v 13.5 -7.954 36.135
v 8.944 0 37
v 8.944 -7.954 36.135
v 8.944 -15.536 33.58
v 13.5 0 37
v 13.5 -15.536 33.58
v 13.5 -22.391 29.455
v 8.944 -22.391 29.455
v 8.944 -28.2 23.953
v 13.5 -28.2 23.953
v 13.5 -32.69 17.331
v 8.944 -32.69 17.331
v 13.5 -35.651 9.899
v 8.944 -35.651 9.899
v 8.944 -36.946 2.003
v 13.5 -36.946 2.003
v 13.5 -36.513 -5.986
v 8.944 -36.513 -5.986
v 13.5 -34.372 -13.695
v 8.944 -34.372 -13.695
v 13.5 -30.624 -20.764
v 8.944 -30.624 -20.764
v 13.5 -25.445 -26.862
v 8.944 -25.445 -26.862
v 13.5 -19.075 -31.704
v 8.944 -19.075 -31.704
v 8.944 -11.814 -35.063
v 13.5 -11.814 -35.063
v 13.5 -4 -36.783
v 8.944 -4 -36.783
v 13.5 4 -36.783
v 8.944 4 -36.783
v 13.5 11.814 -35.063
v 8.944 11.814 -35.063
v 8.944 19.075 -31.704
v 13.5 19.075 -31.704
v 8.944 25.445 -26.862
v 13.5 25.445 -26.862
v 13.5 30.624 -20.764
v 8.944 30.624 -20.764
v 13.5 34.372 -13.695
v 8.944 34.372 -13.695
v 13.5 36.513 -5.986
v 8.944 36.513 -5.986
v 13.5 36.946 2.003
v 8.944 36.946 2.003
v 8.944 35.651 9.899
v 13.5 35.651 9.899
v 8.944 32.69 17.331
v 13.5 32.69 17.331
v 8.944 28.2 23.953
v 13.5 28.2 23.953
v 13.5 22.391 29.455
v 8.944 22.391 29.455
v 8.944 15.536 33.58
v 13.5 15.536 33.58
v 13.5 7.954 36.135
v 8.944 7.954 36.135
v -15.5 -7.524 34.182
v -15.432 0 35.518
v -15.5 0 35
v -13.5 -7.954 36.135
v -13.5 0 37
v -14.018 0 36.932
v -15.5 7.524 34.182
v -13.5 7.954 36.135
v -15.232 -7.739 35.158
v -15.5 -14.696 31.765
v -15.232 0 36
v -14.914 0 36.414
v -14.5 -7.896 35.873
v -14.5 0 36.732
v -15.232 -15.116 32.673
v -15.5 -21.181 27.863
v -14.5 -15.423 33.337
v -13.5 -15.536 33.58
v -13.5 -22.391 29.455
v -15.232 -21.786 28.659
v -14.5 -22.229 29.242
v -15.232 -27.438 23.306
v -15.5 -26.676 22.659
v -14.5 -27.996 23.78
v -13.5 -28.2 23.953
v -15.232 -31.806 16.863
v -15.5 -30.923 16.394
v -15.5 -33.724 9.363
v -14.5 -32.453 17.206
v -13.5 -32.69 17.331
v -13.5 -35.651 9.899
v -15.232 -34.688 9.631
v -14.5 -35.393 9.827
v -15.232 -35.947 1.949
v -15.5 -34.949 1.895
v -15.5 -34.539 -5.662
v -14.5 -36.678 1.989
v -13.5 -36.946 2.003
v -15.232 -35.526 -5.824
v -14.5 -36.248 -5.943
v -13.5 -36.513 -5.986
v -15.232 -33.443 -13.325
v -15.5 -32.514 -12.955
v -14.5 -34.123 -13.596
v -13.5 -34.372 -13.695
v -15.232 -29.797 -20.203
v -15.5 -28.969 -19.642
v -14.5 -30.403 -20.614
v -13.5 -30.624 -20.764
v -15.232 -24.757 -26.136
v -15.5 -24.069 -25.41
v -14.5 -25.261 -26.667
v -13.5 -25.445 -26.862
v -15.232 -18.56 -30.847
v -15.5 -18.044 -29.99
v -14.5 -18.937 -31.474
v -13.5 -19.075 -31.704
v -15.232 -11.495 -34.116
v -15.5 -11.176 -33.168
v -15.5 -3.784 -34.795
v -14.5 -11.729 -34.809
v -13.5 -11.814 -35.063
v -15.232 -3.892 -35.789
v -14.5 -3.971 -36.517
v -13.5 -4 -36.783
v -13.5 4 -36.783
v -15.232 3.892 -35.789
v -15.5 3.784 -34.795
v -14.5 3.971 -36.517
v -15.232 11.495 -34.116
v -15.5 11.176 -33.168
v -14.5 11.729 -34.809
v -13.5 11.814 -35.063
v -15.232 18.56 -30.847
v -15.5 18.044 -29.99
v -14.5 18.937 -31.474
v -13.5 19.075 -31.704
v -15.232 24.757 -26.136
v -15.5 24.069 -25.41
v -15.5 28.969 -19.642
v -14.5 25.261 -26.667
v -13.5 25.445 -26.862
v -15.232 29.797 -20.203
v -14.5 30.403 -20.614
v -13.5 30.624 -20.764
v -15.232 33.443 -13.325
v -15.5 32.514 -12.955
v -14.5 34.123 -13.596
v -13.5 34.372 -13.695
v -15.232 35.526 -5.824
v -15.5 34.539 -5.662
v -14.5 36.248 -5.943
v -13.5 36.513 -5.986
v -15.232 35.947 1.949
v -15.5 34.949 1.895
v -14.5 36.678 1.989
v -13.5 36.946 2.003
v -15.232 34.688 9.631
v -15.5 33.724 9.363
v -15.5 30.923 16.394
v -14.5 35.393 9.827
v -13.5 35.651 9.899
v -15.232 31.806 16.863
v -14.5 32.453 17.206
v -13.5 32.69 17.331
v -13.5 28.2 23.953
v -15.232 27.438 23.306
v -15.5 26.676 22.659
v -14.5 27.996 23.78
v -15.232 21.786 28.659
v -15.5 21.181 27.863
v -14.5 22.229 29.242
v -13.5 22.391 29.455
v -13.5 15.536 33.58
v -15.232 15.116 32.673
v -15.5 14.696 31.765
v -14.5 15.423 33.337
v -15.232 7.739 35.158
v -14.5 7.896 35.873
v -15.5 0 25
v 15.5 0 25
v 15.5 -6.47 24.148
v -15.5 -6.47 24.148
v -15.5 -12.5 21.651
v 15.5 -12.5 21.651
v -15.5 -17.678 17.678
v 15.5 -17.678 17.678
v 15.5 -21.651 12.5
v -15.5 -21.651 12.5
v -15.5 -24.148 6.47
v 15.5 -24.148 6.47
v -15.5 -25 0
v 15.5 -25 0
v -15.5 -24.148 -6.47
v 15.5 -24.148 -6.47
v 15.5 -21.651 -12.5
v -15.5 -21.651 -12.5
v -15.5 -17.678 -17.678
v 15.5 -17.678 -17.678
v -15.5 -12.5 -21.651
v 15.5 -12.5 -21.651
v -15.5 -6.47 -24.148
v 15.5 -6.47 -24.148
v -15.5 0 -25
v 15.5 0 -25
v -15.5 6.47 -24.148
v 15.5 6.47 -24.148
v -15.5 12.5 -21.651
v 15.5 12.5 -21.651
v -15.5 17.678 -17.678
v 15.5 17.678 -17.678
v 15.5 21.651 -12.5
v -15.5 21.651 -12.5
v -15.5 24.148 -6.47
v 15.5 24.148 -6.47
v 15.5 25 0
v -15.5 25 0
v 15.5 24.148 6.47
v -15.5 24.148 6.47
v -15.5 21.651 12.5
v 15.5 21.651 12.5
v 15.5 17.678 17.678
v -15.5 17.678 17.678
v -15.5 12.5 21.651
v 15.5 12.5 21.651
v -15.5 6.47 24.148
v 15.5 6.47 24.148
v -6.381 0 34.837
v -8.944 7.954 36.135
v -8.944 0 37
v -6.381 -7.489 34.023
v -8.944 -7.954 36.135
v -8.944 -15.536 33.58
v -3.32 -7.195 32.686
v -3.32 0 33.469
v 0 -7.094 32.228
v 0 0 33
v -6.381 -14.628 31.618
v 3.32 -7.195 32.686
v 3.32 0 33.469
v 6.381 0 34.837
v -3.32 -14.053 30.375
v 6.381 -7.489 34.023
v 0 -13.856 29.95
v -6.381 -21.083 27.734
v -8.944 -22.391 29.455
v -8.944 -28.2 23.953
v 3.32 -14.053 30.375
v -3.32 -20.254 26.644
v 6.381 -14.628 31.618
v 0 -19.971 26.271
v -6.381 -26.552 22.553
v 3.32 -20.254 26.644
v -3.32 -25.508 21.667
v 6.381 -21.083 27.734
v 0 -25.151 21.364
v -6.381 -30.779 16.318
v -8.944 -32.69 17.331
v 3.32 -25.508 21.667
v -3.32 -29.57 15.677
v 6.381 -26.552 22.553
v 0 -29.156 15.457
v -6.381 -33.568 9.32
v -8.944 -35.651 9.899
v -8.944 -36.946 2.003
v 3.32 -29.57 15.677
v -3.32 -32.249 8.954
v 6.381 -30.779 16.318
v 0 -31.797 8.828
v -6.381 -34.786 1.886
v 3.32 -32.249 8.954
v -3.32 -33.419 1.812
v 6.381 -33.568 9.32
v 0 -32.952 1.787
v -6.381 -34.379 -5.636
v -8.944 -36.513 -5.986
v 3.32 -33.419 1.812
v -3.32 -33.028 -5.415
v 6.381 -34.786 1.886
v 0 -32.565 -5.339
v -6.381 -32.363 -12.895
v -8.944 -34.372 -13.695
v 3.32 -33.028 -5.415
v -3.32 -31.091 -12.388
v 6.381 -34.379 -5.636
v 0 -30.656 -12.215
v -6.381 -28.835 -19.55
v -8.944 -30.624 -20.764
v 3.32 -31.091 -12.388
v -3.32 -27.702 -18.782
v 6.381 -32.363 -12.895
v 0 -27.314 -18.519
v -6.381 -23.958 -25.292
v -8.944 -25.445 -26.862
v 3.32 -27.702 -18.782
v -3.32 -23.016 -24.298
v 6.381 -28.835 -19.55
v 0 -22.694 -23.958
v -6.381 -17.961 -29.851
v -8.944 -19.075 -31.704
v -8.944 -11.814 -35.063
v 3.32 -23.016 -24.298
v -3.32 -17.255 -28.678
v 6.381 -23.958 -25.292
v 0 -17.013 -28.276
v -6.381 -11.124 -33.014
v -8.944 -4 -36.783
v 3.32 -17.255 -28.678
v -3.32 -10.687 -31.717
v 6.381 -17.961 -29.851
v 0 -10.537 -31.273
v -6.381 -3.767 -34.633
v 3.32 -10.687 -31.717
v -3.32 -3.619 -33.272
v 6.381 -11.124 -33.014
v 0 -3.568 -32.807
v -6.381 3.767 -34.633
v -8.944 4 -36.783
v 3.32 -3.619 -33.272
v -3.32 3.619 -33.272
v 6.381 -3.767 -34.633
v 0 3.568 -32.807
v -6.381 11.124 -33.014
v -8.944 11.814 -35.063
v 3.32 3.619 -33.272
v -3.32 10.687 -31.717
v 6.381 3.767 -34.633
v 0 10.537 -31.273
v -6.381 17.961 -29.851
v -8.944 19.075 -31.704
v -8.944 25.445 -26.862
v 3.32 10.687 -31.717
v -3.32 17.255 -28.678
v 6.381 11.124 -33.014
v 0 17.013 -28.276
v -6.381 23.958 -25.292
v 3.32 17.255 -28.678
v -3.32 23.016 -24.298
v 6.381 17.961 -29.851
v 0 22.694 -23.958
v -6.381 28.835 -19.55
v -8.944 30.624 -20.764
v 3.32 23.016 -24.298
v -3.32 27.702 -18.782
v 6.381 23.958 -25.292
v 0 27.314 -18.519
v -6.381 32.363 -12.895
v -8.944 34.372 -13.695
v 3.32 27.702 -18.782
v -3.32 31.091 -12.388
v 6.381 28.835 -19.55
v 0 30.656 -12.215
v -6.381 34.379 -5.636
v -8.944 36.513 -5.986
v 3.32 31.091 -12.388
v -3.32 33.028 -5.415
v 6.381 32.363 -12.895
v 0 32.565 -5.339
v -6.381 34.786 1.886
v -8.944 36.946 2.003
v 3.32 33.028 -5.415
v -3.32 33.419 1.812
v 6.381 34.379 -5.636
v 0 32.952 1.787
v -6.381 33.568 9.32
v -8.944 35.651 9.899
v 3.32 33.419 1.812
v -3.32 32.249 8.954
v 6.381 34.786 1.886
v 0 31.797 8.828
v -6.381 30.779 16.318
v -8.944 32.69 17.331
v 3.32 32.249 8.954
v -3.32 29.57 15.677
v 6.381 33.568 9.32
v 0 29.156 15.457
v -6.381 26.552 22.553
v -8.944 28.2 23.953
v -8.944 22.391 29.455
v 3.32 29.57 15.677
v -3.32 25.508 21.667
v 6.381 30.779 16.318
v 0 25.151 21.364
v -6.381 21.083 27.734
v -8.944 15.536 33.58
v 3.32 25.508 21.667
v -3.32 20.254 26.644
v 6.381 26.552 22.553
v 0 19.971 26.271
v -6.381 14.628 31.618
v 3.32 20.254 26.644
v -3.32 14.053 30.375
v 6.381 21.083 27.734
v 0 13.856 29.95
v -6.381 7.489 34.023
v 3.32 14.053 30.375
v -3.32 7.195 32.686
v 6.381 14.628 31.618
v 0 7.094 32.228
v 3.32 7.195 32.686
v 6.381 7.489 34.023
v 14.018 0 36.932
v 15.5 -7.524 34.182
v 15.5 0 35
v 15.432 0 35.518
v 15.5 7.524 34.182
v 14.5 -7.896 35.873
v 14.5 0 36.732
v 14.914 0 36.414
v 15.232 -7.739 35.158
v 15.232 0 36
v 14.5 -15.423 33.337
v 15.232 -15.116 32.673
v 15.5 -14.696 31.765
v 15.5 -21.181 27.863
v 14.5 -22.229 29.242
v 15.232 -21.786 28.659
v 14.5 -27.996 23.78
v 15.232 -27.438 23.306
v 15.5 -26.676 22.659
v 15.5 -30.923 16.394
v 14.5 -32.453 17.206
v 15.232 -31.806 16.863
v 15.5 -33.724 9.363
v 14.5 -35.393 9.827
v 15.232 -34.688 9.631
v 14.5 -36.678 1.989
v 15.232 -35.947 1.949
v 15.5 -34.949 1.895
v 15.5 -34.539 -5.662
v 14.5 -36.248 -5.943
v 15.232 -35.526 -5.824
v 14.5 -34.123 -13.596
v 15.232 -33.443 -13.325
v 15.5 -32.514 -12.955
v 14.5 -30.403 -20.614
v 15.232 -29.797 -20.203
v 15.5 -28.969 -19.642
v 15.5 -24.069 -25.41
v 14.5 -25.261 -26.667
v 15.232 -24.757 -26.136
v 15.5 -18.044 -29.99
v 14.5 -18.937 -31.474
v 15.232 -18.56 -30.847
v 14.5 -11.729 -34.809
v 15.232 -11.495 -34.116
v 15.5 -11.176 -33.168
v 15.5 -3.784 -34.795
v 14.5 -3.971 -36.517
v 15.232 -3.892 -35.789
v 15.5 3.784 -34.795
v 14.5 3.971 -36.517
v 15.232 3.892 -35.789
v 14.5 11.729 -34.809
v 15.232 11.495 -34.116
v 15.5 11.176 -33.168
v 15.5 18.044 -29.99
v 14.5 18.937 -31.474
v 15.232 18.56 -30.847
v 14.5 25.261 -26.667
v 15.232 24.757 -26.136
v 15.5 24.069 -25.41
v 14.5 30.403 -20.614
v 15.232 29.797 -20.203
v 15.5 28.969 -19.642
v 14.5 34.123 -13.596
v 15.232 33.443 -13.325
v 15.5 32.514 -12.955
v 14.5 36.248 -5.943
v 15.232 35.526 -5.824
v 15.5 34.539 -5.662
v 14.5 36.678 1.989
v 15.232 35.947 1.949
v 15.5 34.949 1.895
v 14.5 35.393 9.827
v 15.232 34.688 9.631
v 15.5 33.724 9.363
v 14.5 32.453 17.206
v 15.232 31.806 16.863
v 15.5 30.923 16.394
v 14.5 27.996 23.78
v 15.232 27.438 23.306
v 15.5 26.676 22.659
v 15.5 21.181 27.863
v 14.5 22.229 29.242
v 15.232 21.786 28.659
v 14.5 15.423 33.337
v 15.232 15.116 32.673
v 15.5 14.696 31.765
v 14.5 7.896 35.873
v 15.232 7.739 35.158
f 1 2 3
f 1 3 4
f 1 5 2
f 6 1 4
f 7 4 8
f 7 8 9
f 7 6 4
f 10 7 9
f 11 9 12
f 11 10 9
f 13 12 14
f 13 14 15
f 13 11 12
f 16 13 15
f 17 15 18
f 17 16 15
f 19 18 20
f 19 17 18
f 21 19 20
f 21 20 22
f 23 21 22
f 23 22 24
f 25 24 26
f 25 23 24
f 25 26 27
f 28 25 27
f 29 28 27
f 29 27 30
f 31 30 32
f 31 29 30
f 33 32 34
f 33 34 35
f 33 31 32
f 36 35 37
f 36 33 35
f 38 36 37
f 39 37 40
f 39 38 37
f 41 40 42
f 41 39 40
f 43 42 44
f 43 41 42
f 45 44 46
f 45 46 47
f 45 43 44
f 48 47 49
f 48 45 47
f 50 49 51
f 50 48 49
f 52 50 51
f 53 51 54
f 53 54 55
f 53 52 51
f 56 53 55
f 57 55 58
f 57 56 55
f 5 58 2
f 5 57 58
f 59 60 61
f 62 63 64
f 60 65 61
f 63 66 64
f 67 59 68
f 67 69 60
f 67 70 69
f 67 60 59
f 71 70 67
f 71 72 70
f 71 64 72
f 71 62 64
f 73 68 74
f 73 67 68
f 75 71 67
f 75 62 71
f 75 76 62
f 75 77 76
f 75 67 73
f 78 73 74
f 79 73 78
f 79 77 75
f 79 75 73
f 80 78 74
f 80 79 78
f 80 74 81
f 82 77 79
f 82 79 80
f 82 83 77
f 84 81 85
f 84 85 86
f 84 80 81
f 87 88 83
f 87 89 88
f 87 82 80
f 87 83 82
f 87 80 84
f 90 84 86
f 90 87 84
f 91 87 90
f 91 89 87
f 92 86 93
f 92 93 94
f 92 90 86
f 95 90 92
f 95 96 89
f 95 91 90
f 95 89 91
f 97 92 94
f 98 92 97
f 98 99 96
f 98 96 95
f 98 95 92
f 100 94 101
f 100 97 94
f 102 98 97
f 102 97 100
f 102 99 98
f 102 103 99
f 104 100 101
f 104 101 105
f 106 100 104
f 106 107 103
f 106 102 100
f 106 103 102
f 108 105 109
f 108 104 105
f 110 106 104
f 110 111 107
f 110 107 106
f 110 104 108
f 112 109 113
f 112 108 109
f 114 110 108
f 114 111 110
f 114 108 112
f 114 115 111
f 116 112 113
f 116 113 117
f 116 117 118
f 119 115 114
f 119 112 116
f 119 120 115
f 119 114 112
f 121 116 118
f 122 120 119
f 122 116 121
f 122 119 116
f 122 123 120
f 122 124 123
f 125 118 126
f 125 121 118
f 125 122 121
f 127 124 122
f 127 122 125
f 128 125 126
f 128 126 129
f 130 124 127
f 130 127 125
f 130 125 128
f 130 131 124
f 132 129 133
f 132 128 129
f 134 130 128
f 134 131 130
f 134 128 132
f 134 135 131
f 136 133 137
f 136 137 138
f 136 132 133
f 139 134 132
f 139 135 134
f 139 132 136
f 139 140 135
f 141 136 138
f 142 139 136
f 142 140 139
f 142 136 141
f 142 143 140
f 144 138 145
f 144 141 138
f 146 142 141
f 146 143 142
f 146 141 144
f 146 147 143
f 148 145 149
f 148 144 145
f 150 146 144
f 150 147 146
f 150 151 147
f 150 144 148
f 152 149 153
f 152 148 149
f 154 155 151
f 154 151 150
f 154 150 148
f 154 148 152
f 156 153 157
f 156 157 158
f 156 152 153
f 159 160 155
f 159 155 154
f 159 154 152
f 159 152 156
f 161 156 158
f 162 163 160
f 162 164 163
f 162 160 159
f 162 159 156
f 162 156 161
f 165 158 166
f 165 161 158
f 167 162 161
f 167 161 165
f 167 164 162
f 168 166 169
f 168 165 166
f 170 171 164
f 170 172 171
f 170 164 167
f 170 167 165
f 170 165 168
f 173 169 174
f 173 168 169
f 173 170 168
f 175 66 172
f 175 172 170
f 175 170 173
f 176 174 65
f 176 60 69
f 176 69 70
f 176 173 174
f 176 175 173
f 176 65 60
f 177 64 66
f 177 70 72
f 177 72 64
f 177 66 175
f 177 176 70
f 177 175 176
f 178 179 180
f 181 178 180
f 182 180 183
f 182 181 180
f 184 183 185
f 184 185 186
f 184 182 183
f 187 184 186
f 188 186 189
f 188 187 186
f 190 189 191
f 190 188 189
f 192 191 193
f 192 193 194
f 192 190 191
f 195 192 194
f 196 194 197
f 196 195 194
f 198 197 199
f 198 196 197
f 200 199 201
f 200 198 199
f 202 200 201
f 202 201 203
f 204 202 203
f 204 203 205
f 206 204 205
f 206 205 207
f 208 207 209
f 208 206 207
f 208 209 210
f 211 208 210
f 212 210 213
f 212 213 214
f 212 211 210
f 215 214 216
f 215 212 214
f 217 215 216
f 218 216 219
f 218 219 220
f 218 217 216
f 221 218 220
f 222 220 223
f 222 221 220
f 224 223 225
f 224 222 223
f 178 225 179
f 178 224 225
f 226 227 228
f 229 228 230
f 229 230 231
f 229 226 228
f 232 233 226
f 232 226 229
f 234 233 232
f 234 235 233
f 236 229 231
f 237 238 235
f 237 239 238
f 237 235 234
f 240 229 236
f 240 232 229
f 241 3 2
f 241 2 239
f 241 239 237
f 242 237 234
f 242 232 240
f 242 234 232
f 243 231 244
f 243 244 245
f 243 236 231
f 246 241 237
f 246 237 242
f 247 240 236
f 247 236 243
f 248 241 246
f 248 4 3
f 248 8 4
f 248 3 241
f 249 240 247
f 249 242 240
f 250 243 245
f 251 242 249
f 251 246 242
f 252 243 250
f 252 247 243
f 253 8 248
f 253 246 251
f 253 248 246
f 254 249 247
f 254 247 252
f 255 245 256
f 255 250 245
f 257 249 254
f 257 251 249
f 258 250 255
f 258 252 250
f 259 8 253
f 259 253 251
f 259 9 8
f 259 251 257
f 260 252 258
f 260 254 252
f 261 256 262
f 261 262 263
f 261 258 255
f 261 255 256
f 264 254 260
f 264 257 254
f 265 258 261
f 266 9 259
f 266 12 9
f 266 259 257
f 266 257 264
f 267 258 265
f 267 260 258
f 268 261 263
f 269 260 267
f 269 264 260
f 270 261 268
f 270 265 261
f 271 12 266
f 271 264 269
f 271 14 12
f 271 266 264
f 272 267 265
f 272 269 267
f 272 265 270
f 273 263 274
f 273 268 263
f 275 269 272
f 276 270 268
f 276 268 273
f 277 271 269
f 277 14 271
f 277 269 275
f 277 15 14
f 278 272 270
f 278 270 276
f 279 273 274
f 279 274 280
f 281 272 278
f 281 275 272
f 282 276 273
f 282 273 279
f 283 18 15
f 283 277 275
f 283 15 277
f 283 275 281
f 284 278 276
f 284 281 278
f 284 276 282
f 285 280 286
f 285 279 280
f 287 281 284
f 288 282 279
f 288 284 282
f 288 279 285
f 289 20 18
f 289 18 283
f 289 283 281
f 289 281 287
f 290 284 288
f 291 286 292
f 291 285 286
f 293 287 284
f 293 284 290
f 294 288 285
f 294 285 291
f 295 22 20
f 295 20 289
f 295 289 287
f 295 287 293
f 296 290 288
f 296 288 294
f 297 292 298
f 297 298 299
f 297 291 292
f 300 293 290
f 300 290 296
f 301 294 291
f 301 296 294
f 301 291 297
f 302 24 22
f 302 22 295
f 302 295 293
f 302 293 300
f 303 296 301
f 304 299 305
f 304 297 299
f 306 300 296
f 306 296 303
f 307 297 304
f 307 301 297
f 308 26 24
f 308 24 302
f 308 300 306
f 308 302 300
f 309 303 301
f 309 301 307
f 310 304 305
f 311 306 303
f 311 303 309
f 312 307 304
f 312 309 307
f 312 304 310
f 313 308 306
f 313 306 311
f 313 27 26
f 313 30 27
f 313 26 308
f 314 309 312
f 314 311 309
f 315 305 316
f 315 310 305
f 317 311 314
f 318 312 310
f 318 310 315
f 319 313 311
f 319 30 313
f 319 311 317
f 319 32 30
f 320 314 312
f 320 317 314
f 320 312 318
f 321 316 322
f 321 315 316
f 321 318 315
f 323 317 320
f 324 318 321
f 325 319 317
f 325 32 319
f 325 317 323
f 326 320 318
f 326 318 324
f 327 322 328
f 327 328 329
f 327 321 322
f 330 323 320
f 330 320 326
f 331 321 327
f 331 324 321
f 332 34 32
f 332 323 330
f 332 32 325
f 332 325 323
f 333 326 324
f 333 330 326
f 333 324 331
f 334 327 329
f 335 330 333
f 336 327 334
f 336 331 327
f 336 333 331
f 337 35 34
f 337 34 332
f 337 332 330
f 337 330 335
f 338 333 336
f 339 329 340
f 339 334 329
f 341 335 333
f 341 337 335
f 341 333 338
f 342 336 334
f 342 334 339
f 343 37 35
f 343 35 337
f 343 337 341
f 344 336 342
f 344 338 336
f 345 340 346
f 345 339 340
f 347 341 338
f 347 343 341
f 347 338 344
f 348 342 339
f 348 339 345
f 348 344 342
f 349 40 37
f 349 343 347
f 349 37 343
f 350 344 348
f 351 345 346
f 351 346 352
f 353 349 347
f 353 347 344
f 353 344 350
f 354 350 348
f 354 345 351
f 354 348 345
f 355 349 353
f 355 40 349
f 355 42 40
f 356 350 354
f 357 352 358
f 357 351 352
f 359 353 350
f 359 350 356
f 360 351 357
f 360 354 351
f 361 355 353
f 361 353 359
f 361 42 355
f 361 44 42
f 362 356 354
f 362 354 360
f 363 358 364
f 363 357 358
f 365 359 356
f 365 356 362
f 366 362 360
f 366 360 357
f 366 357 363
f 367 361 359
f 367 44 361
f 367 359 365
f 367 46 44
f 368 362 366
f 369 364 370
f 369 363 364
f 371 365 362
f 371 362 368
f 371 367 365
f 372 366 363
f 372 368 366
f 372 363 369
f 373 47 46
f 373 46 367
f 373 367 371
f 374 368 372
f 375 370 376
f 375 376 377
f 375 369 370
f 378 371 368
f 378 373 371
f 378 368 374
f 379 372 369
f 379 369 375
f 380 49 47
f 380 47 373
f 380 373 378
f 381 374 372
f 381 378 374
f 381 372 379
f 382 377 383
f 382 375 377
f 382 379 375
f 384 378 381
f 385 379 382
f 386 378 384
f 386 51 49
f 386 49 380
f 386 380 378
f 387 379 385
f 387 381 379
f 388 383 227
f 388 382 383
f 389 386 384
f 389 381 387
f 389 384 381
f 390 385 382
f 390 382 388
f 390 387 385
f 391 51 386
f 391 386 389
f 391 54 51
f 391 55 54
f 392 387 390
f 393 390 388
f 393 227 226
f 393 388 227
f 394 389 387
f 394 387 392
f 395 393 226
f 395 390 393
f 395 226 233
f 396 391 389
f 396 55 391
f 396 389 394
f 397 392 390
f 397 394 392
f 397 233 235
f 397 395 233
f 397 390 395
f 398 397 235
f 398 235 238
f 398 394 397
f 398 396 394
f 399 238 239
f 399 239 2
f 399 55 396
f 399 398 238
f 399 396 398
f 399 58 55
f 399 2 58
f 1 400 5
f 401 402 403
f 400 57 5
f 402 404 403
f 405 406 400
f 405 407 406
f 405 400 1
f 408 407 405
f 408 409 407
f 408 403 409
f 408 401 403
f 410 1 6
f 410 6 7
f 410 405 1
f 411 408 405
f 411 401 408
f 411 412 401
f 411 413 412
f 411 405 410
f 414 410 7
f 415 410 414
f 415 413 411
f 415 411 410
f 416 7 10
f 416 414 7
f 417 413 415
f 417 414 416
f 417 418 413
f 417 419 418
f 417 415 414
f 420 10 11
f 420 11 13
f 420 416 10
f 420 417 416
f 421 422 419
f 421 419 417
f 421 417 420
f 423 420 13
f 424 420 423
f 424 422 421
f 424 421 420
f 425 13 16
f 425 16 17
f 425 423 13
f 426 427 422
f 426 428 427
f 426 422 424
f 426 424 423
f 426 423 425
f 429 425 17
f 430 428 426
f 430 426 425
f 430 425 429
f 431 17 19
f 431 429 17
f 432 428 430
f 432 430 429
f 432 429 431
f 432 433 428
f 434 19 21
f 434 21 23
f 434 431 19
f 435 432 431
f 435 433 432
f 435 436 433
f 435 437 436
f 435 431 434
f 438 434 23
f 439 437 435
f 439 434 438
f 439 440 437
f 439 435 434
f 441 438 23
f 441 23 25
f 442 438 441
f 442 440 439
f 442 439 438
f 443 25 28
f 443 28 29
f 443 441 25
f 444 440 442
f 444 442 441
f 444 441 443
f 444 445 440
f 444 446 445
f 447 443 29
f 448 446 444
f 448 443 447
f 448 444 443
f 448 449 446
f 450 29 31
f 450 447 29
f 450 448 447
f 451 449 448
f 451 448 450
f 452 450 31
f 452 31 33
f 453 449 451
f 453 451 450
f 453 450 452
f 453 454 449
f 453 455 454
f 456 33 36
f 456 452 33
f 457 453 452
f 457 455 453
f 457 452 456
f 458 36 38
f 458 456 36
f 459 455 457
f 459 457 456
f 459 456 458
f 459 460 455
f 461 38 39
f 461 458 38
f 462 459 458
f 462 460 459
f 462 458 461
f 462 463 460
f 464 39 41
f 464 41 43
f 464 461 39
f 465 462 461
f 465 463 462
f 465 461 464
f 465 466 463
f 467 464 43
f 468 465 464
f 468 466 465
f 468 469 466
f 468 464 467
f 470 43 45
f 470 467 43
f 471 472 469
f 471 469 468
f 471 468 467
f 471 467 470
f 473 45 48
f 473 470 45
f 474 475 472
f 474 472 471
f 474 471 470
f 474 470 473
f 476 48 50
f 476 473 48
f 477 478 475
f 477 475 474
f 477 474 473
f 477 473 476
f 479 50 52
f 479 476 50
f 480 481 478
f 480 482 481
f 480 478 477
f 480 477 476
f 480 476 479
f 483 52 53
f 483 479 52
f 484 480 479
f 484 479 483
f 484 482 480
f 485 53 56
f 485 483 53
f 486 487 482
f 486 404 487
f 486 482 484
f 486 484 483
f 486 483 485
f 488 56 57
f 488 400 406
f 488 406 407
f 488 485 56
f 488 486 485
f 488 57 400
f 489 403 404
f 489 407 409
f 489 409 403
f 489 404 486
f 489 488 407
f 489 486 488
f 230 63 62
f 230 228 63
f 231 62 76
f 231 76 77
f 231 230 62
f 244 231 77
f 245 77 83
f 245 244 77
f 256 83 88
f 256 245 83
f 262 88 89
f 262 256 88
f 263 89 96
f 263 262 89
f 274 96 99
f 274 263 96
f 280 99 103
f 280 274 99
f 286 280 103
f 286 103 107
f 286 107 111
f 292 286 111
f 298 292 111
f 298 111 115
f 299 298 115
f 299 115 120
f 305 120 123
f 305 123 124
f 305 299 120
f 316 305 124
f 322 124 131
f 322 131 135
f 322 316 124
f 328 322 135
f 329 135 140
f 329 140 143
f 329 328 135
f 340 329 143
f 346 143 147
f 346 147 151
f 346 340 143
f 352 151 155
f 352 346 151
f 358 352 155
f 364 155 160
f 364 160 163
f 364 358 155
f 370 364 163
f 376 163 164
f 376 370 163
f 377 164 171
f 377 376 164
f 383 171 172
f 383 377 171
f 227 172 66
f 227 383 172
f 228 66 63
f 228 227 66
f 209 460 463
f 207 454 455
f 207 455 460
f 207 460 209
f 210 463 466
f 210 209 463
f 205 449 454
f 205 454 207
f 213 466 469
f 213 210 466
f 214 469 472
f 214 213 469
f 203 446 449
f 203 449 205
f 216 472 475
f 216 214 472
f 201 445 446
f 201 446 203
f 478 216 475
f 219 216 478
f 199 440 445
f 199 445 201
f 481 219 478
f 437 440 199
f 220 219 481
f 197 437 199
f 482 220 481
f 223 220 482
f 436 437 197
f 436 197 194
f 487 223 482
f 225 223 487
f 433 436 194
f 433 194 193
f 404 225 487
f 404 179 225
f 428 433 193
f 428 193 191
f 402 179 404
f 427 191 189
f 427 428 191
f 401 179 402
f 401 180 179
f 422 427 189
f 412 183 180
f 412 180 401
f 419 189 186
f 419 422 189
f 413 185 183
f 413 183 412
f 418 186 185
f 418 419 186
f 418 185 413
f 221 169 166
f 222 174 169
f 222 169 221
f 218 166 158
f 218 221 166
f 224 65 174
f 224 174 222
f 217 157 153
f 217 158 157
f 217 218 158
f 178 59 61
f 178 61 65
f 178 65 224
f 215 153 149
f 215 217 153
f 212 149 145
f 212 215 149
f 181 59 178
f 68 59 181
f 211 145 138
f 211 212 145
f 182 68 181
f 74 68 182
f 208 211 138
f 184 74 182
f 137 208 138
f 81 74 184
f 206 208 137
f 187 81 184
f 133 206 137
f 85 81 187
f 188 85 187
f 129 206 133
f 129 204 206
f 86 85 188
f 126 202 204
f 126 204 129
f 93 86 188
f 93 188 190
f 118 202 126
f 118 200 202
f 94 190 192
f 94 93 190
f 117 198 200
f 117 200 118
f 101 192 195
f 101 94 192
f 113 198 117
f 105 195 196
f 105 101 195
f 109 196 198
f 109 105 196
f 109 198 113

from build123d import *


with BuildPart() as part:
    # Sketch1 → Revolve1 (revolve)
    with BuildSketch(Plane.XY, mode=Mode.PRIVATE) as revolve1_sk:
        with BuildLine():
            Line((8.94427191, 37), (13.5, 37))
            ThreePointArc((13.5, 37), (14.914213562, 36.414213562), (15.5, 35))
            Line((15.5, 35), (15.5, 25))
            Line((15.5, 25), (-15.5, 25))
            Line((-15.5, 25), (-15.5, 35))
            ThreePointArc((-15.5, 35), (-14.914213562, 36.414213562), (-13.5, 37))
            Line((-13.5, 37), (-8.94427191, 37))
            ThreePointArc((-8.94427191, 37), (0, 33), (8.94427191, 37))
        make_face()
    revolve(revolve1_sk.sketch.rotate(Axis((0, 0, 0), (1, 0, 0)), 90), axis=Axis((0, 0, 0), (1, 0, 0)))


solid = part.part
